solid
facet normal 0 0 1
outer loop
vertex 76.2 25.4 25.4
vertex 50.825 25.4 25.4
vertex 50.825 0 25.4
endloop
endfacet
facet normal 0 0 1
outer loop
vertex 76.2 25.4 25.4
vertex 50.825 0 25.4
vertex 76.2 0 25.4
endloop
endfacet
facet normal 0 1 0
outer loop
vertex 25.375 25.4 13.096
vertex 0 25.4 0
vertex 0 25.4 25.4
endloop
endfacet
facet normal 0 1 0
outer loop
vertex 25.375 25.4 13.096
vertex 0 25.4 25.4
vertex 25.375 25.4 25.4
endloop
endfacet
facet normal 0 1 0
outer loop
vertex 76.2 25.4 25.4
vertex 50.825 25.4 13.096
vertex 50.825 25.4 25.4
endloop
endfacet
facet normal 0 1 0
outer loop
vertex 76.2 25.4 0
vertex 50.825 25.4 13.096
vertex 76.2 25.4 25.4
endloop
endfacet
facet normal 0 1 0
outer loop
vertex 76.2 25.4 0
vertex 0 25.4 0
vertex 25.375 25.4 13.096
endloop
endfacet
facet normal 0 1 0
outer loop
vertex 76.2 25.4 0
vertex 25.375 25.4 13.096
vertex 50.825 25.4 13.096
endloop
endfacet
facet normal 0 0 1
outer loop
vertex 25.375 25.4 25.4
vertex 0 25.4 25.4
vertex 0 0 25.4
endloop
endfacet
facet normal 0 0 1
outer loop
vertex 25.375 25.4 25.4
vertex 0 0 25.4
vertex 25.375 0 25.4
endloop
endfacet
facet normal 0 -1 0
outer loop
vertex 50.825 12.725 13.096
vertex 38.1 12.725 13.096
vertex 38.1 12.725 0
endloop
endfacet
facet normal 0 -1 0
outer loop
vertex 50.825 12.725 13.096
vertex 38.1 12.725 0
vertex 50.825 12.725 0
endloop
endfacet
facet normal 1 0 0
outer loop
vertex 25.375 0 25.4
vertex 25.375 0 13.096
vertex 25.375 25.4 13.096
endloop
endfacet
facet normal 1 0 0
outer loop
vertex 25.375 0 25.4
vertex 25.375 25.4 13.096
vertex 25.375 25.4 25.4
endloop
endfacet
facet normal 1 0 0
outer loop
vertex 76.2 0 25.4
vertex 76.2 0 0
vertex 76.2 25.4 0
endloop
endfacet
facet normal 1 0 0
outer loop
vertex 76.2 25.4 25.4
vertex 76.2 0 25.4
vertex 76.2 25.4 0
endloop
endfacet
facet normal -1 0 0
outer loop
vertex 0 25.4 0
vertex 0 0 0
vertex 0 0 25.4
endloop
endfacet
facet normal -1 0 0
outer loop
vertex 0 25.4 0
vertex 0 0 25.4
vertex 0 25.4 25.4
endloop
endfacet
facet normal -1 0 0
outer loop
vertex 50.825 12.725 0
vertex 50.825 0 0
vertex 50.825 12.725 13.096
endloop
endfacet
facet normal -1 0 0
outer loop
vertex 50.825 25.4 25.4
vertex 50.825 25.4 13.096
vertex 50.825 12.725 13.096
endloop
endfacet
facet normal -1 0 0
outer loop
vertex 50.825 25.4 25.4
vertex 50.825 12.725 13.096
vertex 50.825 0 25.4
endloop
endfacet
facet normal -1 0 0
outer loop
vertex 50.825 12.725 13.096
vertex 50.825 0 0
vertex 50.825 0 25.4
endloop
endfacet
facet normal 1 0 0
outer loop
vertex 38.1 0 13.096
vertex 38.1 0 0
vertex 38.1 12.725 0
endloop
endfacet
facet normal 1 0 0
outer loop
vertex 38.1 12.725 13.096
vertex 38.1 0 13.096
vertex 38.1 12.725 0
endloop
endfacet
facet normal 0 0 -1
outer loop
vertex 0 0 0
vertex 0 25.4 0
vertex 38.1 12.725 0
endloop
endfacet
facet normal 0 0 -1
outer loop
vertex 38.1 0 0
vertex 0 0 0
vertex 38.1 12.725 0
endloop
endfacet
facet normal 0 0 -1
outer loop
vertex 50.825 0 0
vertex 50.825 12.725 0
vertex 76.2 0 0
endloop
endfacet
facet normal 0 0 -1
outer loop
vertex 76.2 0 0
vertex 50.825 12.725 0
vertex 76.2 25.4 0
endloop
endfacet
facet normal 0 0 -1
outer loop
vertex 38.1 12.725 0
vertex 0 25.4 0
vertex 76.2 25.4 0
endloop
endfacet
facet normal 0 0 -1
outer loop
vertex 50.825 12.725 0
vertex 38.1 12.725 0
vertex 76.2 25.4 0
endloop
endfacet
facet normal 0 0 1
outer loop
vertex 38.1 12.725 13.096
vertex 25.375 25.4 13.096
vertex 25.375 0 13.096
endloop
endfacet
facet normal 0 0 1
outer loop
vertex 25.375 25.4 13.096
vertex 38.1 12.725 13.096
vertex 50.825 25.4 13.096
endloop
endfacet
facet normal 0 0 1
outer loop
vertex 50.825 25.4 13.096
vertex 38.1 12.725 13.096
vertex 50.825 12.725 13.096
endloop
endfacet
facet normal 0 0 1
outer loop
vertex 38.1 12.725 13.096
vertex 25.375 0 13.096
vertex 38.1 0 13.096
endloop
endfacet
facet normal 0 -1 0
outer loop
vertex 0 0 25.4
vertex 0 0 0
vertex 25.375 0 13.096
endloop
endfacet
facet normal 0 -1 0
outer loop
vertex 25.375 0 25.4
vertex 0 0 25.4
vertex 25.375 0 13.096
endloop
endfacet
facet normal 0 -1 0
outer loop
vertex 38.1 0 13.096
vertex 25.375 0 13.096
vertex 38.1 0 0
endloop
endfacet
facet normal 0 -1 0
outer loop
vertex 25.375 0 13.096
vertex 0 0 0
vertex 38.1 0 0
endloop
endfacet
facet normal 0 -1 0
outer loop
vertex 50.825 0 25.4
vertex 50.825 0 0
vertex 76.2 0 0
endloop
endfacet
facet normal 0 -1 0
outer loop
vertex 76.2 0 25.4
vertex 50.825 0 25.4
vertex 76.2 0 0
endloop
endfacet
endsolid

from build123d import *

# Parameters (mm, degrees)
F0_W     = 76.2
F0_H     = 25.4
F1_DEPTH = 25.4
F2_W     = 25.4508
F2_H     = 12.7254
F3_DEPTH = 25.4
F4_W     = 12.7254
F4_H     = 12.7254
F5_DEPTH = 25.4


with BuildPart() as f1:
    # F0 (on Top) → F1 (new body)
    with BuildSketch(Plane.XY):
        with Locations((38.1, 12.7)):
            Rectangle(F0_W, F0_H)
    extrude(amount=F1_DEPTH)

    # F2 (on Front) → F3 (cut)
    with BuildSketch(Plane.XZ):
        with Locations((38.1, 19.458432)):
            Rectangle(F2_W, F2_H)
    extrude(amount=-F3_DEPTH, mode=Mode.SUBTRACT)

    # F4 (on face) → F5 (cut)
    with BuildSketch(Plane.XY.offset(13.095732)):
        with Locations((44.4627, 6.3627)):
            Rectangle(F4_W, F4_H)
    extrude(amount=-F5_DEPTH, mode=Mode.SUBTRACT)


solid = f1.part
